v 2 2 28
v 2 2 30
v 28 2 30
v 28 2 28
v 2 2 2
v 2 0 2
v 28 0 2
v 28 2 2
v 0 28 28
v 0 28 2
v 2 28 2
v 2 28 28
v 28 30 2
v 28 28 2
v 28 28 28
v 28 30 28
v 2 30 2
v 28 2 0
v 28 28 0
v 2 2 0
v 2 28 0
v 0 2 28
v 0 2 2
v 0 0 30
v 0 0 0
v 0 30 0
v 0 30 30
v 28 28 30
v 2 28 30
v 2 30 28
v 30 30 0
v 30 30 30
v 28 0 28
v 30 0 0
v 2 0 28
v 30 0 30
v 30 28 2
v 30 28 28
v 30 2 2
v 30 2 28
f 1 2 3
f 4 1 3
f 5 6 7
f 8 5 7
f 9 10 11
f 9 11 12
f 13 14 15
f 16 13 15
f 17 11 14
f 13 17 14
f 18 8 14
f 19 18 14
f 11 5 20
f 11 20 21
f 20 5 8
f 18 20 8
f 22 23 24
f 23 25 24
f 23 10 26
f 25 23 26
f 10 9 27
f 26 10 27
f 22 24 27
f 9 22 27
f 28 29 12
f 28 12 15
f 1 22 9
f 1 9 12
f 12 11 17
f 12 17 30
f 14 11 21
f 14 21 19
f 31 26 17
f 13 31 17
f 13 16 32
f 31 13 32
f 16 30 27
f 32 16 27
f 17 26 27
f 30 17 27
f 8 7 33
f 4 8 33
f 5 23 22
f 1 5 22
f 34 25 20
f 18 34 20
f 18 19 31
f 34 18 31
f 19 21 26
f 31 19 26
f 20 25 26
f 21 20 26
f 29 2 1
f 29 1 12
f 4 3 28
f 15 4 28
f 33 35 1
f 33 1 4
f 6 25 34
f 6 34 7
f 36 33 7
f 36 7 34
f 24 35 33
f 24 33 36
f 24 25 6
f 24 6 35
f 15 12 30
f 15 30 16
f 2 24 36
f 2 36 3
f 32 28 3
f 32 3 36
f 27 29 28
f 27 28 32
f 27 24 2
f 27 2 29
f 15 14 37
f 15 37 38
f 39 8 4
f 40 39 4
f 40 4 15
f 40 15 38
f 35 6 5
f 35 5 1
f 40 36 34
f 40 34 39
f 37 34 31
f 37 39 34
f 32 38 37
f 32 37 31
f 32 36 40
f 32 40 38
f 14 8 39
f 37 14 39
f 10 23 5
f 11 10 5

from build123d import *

# Parameters (mm, degrees)
F0_W     = 30
F0_H     = 30
F1_DEPTH = 30
F2_W     = 26
F2_H     = 26
F3_DEPTH = 30.001
F4_W     = 26
F4_H     = 26
F5_DEPTH = 30.001
F6_W     = 26
F6_H     = 26
F7_DEPTH = 30.001


with BuildPart() as f1:
    # F0 (on Right) → F1 (new body)
    with BuildSketch(Plane.YZ):
        with Locations((15, 15)):
            Rectangle(F0_W, F0_H)
    extrude(amount=F1_DEPTH)

    # F2 (on face) → F3 (cut, through all)
    with BuildSketch(Plane.XZ):
        with Locations((15, 15)):
            Rectangle(F2_W, F2_H)
    extrude(amount=-F3_DEPTH, mode=Mode.SUBTRACT)

    # F4 (on face) → F5 (cut, through all)
    with BuildSketch(Plane(origin=(0, 0, 0), x_dir=(0, -1, 0), z_dir=(-1, 0, 0))):
        with Locations((-15, 15)):
            Rectangle(F4_W, F4_H)
    extrude(amount=-F5_DEPTH, mode=Mode.SUBTRACT)

    # F6 (on face) → F7 (cut, through all)
    with BuildSketch(Plane.XY.offset(30)):
        with Locations((15, 15)):
            Rectangle(F6_W, F6_H)
    extrude(amount=-F7_DEPTH, mode=Mode.SUBTRACT)


solid = f1.part
